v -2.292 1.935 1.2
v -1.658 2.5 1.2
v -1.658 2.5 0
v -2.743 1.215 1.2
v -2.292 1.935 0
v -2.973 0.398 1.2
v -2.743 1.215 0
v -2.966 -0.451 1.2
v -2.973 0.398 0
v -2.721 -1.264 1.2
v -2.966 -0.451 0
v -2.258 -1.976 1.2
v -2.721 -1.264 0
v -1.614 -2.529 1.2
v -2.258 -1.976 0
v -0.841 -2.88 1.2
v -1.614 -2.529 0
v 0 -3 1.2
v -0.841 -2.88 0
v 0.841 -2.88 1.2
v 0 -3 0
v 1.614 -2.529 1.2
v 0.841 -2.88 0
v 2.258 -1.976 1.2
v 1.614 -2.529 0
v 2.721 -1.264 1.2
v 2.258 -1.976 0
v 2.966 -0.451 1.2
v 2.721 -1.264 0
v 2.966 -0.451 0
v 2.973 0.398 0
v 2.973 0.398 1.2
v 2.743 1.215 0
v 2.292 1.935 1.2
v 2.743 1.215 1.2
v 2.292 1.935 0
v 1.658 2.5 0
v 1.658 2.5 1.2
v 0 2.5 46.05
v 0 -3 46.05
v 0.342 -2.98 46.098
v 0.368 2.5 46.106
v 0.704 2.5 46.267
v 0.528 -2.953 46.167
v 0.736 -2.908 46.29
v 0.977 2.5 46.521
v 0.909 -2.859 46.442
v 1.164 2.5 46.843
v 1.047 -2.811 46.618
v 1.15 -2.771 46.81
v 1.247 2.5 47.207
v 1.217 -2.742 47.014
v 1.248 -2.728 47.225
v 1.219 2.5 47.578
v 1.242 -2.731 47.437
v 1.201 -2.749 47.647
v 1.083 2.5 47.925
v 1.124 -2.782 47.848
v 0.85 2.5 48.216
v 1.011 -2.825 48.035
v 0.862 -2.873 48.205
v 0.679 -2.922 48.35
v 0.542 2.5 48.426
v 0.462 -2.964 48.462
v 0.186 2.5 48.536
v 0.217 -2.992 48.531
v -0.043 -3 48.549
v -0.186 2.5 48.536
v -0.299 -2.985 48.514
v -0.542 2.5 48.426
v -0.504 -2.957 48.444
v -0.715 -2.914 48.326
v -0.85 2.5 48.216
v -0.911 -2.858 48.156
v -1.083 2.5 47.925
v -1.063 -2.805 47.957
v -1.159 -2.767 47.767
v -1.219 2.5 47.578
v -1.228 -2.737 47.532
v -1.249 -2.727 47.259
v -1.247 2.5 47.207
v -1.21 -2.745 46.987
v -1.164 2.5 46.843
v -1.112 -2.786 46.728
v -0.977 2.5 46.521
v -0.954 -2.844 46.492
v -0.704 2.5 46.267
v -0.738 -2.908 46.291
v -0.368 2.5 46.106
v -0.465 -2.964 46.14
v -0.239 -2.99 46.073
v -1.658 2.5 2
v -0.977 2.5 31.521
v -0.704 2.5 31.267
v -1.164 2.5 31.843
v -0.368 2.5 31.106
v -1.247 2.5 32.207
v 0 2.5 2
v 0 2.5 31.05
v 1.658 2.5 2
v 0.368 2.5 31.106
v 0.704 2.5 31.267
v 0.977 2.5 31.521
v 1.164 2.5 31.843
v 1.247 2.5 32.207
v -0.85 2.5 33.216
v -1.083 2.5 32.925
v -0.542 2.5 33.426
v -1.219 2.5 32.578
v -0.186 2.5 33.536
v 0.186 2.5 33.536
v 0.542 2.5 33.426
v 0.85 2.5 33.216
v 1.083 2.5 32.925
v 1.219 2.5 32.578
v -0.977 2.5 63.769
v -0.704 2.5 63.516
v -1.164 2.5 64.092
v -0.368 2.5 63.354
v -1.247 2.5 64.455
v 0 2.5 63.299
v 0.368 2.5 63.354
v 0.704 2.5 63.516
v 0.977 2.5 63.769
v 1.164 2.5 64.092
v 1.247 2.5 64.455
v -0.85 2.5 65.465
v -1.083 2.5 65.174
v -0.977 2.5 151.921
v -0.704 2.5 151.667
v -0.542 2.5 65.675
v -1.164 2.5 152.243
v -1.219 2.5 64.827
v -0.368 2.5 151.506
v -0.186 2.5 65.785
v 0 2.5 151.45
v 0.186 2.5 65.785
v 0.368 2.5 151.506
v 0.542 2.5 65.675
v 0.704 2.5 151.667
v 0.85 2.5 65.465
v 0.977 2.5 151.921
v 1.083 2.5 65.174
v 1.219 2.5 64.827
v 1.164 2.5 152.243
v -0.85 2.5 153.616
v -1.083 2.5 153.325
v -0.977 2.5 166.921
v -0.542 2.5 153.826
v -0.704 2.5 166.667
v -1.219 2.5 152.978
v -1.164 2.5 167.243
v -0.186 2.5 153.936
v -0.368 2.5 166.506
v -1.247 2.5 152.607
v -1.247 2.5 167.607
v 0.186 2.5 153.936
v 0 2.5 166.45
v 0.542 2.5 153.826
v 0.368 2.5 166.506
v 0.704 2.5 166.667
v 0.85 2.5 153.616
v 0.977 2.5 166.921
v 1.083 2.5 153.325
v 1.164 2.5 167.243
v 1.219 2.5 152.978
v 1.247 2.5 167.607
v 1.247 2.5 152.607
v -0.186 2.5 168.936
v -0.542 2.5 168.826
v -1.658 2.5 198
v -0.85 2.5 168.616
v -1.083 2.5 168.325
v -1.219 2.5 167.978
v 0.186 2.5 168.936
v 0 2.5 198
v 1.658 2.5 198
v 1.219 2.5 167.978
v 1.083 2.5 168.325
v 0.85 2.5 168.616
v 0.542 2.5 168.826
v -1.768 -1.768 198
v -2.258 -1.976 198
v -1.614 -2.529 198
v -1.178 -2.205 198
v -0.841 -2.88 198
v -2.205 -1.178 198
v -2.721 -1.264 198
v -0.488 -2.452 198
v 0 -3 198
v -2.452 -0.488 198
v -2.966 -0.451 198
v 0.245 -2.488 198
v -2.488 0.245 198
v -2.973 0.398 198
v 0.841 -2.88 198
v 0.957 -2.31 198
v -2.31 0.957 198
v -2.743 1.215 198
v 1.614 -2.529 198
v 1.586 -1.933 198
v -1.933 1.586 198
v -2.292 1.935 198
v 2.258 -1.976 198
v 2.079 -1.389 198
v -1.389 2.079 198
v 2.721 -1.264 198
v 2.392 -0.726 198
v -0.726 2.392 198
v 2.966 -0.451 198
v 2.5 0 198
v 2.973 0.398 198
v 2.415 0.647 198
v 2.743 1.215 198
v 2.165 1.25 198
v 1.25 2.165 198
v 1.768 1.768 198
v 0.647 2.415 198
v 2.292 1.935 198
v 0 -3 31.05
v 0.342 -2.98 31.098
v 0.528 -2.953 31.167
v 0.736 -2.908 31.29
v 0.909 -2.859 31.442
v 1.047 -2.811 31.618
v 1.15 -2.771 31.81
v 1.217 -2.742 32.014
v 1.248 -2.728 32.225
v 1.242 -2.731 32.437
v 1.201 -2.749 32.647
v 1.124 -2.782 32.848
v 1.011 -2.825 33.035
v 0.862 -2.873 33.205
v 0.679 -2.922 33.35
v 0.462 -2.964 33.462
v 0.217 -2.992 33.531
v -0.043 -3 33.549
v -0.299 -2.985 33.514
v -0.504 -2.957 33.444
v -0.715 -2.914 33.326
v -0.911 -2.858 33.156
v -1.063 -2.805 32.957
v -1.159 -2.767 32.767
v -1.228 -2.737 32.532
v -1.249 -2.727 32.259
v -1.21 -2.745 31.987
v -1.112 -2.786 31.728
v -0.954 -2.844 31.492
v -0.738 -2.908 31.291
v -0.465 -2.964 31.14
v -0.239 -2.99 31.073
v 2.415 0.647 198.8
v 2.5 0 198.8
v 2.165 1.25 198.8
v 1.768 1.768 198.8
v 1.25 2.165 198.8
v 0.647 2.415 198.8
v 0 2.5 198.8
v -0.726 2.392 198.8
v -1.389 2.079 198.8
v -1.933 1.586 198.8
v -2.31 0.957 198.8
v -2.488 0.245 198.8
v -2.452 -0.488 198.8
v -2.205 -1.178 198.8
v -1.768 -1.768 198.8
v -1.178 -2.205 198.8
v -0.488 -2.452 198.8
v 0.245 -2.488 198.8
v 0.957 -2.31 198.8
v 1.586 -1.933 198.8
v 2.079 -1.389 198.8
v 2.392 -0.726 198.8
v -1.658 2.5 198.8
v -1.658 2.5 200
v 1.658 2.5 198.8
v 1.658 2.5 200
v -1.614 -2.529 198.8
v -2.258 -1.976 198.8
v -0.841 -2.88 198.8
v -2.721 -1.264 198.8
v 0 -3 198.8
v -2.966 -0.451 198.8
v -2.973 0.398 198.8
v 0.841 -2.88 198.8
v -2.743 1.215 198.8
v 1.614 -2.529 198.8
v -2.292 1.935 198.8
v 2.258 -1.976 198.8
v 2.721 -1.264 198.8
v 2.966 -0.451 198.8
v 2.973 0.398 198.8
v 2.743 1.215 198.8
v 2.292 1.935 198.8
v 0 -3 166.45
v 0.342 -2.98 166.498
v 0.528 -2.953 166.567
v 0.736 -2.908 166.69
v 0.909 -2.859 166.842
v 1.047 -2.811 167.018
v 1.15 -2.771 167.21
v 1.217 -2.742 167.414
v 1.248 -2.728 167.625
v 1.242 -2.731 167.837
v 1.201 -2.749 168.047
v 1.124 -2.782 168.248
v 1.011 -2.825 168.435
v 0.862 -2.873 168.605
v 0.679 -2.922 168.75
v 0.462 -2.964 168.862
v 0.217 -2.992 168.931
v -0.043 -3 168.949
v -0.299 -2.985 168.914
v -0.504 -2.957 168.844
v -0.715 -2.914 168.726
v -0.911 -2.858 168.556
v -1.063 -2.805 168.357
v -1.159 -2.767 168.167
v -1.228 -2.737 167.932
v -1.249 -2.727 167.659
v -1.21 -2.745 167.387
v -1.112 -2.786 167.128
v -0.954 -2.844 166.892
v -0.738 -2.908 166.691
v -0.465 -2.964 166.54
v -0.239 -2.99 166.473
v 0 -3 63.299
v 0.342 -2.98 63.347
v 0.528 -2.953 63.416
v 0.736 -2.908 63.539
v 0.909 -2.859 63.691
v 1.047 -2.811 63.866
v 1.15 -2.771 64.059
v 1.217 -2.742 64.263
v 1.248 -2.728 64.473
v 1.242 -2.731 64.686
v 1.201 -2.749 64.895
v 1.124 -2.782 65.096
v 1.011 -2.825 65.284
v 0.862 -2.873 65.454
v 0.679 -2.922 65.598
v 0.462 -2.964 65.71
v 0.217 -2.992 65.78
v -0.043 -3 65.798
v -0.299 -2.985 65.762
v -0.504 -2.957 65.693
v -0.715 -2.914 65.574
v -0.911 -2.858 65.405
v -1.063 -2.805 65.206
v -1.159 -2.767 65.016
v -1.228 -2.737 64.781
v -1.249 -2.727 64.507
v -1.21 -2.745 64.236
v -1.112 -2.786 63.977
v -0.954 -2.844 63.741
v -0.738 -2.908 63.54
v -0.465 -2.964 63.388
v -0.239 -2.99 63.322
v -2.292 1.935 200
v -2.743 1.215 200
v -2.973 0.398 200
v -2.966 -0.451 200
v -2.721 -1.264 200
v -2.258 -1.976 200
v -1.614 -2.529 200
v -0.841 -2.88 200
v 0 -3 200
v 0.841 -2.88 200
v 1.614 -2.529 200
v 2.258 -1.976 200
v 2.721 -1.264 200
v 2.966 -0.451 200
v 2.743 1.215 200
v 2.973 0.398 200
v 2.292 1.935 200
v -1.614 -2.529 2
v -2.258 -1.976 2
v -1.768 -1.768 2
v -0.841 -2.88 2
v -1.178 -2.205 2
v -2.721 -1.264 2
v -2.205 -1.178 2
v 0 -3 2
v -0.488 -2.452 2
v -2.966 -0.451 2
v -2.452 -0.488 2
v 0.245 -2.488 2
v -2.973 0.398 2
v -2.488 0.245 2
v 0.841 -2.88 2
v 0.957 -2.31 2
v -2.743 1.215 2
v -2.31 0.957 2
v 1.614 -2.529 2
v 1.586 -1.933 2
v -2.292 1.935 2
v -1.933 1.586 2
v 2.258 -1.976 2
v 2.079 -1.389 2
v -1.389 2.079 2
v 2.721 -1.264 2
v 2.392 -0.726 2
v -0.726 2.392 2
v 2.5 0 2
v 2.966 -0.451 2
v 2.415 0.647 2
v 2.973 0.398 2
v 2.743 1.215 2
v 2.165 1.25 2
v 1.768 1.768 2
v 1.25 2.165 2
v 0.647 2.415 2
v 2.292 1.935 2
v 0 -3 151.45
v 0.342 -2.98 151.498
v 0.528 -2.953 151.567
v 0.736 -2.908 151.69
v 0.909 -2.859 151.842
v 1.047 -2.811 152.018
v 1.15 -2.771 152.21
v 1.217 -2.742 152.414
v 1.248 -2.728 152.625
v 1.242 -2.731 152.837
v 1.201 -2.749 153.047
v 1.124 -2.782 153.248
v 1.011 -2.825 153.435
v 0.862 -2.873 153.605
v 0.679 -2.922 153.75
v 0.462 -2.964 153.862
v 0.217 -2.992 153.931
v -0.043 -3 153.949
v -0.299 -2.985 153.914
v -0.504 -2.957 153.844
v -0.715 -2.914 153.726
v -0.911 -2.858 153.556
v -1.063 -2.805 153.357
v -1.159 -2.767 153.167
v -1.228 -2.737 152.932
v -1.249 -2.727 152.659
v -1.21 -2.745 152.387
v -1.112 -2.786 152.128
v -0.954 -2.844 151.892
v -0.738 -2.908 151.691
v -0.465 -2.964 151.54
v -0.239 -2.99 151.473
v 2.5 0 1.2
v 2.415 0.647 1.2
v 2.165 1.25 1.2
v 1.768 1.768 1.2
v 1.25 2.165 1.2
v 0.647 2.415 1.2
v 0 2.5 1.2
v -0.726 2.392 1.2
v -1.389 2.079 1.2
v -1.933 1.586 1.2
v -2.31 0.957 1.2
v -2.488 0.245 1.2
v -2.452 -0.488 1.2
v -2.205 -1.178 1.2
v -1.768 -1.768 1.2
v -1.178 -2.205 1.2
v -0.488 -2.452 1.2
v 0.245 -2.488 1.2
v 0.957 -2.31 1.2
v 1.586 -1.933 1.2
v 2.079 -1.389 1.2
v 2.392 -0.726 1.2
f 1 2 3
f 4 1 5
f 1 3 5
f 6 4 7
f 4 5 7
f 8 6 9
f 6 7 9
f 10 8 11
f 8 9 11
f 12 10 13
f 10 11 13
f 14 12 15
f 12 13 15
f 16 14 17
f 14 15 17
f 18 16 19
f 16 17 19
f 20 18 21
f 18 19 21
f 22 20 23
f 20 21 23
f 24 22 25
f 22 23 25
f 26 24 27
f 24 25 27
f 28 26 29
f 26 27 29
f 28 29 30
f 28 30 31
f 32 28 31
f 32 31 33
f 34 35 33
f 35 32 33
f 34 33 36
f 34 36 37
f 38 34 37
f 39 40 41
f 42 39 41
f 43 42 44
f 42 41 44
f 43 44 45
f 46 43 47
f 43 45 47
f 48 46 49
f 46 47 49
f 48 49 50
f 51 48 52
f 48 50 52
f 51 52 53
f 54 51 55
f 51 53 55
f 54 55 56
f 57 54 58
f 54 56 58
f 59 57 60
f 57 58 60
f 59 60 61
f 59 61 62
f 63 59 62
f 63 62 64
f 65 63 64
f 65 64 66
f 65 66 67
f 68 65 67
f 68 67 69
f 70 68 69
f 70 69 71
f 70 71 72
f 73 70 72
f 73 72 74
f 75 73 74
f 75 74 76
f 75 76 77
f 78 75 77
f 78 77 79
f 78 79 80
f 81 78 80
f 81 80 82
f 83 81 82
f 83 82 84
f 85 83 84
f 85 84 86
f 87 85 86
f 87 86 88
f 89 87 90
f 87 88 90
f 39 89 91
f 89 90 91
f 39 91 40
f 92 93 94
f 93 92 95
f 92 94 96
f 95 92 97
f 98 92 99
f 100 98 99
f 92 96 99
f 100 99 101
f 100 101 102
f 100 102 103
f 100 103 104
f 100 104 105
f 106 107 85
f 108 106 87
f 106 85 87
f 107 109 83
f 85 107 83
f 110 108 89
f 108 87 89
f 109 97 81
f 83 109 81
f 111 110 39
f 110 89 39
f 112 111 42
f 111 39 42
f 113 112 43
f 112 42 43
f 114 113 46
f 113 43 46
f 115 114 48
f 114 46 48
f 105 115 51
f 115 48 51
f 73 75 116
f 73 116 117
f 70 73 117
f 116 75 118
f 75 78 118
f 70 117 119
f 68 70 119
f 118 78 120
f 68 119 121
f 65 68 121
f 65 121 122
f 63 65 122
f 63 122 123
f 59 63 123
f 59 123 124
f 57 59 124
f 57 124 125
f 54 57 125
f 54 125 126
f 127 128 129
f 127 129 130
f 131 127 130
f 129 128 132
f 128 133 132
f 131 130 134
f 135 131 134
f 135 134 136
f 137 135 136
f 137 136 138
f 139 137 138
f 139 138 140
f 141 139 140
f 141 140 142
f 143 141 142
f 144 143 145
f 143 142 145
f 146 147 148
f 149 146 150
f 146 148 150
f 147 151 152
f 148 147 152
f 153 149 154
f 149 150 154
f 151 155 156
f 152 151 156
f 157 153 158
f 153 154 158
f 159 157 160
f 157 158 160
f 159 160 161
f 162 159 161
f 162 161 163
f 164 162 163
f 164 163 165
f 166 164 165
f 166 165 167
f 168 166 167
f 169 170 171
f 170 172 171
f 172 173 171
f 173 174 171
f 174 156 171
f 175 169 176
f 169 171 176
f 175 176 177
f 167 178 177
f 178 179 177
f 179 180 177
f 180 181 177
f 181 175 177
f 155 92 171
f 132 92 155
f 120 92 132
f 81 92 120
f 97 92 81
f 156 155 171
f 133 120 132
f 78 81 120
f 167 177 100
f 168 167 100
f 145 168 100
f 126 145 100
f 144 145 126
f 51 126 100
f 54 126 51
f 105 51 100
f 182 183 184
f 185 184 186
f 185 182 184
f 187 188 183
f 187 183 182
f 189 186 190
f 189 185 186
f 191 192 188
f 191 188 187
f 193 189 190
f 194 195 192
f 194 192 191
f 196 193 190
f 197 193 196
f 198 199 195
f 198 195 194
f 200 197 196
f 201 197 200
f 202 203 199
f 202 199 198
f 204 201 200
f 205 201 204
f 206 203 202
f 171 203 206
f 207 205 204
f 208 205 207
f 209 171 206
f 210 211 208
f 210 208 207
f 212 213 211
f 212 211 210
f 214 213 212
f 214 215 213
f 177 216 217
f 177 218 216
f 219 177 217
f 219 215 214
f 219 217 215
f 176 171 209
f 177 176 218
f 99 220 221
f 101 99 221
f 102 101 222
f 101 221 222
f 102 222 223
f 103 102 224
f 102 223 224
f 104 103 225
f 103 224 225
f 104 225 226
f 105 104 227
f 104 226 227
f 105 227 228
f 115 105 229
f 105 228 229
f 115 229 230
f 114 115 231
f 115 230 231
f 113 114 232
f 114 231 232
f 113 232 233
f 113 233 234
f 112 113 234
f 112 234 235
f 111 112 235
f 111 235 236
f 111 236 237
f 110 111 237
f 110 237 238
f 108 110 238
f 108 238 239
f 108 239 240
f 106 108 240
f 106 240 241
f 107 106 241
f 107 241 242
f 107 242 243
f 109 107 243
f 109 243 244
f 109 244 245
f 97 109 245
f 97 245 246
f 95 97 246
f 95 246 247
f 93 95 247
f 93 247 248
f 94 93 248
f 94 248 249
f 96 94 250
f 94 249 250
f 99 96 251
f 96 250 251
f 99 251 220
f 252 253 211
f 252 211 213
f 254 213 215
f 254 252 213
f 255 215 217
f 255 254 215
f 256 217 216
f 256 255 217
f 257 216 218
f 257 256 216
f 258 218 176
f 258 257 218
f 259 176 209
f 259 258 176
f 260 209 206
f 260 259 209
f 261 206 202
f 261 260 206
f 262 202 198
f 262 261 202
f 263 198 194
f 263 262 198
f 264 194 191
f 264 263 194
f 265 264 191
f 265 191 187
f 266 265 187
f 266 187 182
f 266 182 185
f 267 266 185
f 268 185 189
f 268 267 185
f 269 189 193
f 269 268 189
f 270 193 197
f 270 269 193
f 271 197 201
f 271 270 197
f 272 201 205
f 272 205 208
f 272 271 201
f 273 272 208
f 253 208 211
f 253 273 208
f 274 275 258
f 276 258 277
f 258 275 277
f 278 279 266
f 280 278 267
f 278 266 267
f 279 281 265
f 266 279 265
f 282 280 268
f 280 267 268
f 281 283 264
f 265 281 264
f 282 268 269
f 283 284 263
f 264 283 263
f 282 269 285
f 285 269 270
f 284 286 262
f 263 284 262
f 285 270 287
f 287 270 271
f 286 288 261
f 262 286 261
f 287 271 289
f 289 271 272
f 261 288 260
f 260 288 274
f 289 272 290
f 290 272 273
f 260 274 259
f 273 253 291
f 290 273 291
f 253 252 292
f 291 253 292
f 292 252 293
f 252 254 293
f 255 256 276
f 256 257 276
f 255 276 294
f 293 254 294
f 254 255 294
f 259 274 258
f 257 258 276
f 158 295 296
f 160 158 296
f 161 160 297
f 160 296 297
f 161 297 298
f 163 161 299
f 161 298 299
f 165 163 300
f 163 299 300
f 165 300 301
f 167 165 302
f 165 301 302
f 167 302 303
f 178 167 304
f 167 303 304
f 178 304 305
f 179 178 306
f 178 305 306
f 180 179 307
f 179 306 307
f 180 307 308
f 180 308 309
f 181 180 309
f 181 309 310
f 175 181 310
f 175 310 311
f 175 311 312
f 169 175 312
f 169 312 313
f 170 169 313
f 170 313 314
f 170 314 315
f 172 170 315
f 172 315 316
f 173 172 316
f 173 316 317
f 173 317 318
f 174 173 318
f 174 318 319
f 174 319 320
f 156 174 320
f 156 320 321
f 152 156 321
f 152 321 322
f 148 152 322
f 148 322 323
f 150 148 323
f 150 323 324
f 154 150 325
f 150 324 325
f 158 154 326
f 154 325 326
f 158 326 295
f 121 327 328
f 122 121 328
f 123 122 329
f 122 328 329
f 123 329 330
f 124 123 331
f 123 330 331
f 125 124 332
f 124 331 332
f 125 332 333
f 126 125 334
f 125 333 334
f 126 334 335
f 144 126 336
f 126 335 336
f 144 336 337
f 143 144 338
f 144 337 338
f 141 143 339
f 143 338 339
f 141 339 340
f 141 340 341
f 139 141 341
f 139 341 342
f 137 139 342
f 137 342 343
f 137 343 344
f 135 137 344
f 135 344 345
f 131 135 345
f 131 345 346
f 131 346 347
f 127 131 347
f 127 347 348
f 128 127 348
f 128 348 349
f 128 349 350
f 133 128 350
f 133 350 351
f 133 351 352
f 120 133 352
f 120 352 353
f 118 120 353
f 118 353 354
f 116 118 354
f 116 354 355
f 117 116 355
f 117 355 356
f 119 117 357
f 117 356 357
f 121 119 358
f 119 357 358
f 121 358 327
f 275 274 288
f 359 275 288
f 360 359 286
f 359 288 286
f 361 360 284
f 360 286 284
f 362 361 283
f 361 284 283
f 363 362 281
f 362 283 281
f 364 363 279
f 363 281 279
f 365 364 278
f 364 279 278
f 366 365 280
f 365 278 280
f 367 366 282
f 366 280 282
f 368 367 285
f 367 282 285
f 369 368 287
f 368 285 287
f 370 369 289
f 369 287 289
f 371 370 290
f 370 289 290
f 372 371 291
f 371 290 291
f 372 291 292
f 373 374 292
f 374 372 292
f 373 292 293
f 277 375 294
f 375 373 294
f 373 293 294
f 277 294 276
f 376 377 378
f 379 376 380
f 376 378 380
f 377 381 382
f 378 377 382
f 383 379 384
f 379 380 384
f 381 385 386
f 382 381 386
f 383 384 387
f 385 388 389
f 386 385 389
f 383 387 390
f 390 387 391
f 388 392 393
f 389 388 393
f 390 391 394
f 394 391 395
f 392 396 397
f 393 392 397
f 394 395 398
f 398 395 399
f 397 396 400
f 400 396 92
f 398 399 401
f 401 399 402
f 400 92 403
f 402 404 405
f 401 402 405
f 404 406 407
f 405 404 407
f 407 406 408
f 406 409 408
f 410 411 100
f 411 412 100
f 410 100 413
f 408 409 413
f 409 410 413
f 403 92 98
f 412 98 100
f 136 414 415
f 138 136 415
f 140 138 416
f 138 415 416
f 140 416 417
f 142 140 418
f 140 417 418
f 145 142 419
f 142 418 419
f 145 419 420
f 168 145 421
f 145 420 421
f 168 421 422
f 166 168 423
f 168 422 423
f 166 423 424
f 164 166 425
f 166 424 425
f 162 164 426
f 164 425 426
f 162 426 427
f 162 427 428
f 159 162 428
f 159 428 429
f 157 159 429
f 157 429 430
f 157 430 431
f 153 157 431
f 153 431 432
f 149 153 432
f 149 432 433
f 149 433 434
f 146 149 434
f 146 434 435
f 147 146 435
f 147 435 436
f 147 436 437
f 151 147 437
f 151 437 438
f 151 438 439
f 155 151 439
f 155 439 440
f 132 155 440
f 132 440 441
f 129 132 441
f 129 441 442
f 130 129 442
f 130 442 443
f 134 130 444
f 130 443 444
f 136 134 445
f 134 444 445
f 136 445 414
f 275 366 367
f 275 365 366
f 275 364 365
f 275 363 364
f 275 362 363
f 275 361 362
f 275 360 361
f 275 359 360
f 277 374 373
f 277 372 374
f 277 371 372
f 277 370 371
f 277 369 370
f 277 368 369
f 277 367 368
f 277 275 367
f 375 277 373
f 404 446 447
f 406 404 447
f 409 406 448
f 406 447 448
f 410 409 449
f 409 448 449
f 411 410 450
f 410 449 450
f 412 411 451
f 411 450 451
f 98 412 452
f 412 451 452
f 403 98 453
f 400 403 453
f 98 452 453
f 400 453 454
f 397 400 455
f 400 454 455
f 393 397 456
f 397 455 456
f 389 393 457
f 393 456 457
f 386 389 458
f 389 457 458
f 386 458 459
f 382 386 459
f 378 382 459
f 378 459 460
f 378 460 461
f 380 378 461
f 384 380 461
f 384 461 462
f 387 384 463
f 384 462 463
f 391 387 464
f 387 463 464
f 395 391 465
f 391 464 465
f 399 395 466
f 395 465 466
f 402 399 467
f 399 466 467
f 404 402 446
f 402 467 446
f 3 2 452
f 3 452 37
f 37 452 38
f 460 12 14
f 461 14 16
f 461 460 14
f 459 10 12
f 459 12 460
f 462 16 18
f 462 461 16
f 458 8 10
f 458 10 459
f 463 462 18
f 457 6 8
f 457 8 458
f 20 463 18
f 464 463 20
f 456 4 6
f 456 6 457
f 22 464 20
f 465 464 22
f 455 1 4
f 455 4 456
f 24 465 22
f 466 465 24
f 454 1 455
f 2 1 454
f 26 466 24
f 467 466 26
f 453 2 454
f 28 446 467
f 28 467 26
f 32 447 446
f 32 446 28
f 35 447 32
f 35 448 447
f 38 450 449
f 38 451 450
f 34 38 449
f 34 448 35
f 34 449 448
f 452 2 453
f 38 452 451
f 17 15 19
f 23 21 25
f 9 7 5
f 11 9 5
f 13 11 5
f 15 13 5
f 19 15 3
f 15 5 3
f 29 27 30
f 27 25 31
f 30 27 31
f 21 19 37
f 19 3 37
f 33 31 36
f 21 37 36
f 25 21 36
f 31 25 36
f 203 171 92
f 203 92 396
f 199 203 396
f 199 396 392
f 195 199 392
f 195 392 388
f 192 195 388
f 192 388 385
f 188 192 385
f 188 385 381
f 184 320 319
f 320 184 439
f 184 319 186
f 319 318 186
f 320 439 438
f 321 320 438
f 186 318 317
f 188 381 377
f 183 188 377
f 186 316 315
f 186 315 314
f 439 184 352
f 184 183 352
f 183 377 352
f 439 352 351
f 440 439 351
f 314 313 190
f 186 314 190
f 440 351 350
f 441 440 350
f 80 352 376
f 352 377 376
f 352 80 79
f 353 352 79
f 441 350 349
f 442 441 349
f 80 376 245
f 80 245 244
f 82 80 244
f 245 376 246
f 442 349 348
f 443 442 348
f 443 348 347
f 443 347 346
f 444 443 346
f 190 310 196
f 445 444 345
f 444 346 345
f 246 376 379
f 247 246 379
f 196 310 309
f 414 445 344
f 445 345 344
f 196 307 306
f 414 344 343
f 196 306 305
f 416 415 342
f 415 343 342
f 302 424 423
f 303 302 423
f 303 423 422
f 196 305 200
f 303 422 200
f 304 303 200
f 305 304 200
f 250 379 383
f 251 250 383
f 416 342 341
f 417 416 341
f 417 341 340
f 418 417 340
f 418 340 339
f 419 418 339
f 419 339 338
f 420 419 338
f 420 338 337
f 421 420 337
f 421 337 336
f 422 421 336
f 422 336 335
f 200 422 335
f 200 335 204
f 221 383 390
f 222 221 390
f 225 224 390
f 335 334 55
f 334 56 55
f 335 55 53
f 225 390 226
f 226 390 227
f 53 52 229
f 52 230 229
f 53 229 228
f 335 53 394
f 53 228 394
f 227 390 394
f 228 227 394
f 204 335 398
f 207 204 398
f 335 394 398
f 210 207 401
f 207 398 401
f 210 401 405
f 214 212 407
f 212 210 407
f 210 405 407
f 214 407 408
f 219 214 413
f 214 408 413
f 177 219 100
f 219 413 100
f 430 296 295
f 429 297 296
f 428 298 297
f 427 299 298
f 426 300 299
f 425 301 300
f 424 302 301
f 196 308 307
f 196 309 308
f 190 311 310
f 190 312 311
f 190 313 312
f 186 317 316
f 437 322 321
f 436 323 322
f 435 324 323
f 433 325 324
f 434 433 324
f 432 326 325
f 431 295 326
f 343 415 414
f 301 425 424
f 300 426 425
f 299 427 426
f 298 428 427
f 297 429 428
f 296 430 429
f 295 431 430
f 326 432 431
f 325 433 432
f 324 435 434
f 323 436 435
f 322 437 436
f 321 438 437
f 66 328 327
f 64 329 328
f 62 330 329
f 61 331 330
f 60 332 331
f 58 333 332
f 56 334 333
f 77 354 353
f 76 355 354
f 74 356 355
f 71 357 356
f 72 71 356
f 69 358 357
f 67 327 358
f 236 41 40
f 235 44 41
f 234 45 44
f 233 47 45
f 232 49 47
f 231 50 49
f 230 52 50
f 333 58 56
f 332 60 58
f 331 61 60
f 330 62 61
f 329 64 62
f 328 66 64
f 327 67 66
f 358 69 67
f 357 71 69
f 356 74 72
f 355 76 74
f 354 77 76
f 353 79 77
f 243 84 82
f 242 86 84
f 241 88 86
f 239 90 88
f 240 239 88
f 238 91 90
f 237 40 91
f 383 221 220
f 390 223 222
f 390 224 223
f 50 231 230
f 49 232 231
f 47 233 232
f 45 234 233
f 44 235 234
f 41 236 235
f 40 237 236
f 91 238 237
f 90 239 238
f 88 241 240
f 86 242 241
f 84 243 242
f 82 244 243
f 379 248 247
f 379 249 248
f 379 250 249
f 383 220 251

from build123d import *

# Parameters (mm, degrees)
SKETCH1_R           = 3
BOSS_EXTRUDE1_DEPTH = 200
CUT_EXTRUDE1_DEPTH  = 201
M3_TAPPED_HOLE1_D   = 2.5
M3_TAPPED_HOLE2_D   = 2.5
CUT_EXTRUDE2_START  = -1.2
SKETCH9_R           = 3
SKETCH9_R_2         = 2.5
CUT_EXTRUDE2_DEPTH  = 0.8


with BuildPart() as part:
    # Sketch1 → Boss-Extrude1 (new body)
    with BuildSketch(Plane.XY):
        Circle(SKETCH1_R)
    extrude(amount=BOSS_EXTRUDE1_DEPTH)

    # Sketch2 → Cut-Extrude1 (cut, through all)
    with BuildSketch(Plane.XY.offset(200)):
        with BuildLine():
            Line((-1.658312395, 2.5), (1.658312395, 2.5))
            ThreePointArc((1.658312395, 2.5), (0, 3), (-1.658312395, 2.5))
        make_face()
    extrude(amount=-CUT_EXTRUDE1_DEPTH, mode=Mode.SUBTRACT)

    # M3 Tapped Hole1 (through all)
    with Locations(Plane(origin=(0, 2.5, 167.7), x_dir=(0, 0, 1), z_dir=(0, 1, 0))):
        with Locations((0, 0), (-15, 0), (-120.4, 0), (-135.4, 0)):
            Hole(M3_TAPPED_HOLE1_D / 2)

    # M3 Tapped Hole2 (through all)
    with Locations(Plane(origin=(0, 2.5, 64.548836503), x_dir=(0, 0, 1), z_dir=(0, 1, 0))):
        with Locations((0, 0)):
            Hole(M3_TAPPED_HOLE2_D / 2)

    # Sketch9 → Cut-Extrude2 (cut)
    with BuildSketch(Plane.XY.offset(200).offset(CUT_EXTRUDE2_START)):
        Circle(SKETCH9_R)
        Circle(SKETCH9_R_2, mode=Mode.SUBTRACT)
    cut_extrude2 = extrude(amount=-CUT_EXTRUDE2_DEPTH, mode=Mode.SUBTRACT)

    # Mirror1: Cut-Extrude2 across plane
    add(cut_extrude2.mirror(Plane.XY.offset(100)), mode=Mode.SUBTRACT)


solid = part.part
